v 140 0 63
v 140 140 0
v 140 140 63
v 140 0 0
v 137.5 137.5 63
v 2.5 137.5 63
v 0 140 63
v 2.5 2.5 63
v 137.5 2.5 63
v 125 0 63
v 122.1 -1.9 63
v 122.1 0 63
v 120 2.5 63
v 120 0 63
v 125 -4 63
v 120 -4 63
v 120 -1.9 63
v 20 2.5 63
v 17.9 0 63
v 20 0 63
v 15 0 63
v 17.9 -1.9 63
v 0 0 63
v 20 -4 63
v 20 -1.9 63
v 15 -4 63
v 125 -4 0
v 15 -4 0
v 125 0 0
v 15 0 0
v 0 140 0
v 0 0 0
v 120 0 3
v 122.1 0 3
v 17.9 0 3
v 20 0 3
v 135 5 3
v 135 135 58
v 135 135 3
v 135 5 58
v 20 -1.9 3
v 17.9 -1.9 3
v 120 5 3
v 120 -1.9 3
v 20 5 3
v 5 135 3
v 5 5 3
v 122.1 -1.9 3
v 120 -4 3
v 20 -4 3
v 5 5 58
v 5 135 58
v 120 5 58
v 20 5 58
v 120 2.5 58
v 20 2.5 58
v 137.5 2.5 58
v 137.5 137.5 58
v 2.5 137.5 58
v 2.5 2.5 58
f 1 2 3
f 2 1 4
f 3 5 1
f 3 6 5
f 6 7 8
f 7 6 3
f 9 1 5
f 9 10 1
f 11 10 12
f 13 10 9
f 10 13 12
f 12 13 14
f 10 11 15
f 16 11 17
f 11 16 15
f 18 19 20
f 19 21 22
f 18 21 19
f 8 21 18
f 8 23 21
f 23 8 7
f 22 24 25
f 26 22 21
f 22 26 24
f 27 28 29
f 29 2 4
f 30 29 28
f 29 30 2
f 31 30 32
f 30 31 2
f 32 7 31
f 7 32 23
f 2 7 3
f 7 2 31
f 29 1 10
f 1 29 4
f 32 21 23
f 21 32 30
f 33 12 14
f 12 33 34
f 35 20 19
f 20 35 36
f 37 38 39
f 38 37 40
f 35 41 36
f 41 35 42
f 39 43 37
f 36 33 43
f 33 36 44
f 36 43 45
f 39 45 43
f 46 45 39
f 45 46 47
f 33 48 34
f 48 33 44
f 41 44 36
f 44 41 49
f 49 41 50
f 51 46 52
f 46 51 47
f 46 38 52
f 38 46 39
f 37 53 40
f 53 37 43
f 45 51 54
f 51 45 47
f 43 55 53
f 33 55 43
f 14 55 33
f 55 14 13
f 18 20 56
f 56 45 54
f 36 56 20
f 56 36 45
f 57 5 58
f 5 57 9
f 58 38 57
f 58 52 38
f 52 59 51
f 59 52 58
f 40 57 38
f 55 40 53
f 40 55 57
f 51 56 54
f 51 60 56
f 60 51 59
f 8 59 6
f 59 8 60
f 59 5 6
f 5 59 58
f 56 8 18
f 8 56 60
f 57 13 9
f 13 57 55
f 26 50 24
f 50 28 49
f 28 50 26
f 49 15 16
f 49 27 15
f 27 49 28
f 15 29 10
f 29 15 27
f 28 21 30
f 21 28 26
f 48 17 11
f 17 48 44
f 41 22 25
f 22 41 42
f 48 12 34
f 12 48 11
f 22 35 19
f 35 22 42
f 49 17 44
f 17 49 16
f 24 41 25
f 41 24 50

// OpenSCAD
petri_diameter = 80;  // Диаметр чашки Петри


box_width = 130;      // Внутренняя ширина коробки
box_height = 60;      // Внутренняя высота коробки
wall_thickness = 5;   // Толшина стенки
bottom_thickness = 3; // Толнина дна

slot_height = 5;            // Ширина паза для установки трубы 
slot_width = slot_height/2; // Толшина паза для установки трубы

doorslot_width = 5;       // Толшина паза для установки шторки
doorslot_depth = 2.1;     // Ширина паза для установки шторки
doorslot_thickness = 4;   // Толшина выступа для монтажа шторки
door_width = 100;         // ширина отверстия двери
door_height = box_height; // высота отверстия двери
eps = 0.02;


module lightbox_base() {
    difference() {
        cube([
            box_width + 2*wall_thickness,
            box_width + 2*wall_thickness,
            box_height + bottom_thickness
        ]);
        translate([wall_thickness, wall_thickness, bottom_thickness]) {
            cube([box_width, box_width, box_height]);
        }
        translate([// Оверстие двери
            wall_thickness + (box_width - door_width)/2,
            -1,
            bottom_thickness + (box_height - door_height)/2
        ]) {
            cube([door_width, wall_thickness + 2, door_height]);
        }
        translate([ //Паз для установки верхней трубы
            wall_thickness-slot_width,
            wall_thickness-slot_width, 
            box_height+bottom_thickness - slot_height
        ]) {
            cube([box_width+2*slot_width, box_width+2*slot_width, slot_height]);
        }
    };
};
module doorslot() {//Паз для установки двери
    difference() {
        cube([doorslot_thickness, door_width+2*doorslot_width, door_height+bottom_thickness]);
        translate([doorslot_depth, doorslot_width-doorslot_depth, bottom_thickness]) {
            cube([doorslot_depth, door_width+2*doorslot_depth, door_height]);
        }
        translate([0, doorslot_width, bottom_thickness]) {
            cube([doorslot_depth, door_width, door_height]);
        }
    }
        
};
 
module Box() {//Паз для установки двери
    lightbox_base();
    translate([
        wall_thickness + (box_width - door_width)/2 - doorslot_width,
        -doorslot_thickness,  
        0
    ]){
        mirror ([0,1,0]) rotate([0,0,-90]) doorslot();
    }
};

Box();
